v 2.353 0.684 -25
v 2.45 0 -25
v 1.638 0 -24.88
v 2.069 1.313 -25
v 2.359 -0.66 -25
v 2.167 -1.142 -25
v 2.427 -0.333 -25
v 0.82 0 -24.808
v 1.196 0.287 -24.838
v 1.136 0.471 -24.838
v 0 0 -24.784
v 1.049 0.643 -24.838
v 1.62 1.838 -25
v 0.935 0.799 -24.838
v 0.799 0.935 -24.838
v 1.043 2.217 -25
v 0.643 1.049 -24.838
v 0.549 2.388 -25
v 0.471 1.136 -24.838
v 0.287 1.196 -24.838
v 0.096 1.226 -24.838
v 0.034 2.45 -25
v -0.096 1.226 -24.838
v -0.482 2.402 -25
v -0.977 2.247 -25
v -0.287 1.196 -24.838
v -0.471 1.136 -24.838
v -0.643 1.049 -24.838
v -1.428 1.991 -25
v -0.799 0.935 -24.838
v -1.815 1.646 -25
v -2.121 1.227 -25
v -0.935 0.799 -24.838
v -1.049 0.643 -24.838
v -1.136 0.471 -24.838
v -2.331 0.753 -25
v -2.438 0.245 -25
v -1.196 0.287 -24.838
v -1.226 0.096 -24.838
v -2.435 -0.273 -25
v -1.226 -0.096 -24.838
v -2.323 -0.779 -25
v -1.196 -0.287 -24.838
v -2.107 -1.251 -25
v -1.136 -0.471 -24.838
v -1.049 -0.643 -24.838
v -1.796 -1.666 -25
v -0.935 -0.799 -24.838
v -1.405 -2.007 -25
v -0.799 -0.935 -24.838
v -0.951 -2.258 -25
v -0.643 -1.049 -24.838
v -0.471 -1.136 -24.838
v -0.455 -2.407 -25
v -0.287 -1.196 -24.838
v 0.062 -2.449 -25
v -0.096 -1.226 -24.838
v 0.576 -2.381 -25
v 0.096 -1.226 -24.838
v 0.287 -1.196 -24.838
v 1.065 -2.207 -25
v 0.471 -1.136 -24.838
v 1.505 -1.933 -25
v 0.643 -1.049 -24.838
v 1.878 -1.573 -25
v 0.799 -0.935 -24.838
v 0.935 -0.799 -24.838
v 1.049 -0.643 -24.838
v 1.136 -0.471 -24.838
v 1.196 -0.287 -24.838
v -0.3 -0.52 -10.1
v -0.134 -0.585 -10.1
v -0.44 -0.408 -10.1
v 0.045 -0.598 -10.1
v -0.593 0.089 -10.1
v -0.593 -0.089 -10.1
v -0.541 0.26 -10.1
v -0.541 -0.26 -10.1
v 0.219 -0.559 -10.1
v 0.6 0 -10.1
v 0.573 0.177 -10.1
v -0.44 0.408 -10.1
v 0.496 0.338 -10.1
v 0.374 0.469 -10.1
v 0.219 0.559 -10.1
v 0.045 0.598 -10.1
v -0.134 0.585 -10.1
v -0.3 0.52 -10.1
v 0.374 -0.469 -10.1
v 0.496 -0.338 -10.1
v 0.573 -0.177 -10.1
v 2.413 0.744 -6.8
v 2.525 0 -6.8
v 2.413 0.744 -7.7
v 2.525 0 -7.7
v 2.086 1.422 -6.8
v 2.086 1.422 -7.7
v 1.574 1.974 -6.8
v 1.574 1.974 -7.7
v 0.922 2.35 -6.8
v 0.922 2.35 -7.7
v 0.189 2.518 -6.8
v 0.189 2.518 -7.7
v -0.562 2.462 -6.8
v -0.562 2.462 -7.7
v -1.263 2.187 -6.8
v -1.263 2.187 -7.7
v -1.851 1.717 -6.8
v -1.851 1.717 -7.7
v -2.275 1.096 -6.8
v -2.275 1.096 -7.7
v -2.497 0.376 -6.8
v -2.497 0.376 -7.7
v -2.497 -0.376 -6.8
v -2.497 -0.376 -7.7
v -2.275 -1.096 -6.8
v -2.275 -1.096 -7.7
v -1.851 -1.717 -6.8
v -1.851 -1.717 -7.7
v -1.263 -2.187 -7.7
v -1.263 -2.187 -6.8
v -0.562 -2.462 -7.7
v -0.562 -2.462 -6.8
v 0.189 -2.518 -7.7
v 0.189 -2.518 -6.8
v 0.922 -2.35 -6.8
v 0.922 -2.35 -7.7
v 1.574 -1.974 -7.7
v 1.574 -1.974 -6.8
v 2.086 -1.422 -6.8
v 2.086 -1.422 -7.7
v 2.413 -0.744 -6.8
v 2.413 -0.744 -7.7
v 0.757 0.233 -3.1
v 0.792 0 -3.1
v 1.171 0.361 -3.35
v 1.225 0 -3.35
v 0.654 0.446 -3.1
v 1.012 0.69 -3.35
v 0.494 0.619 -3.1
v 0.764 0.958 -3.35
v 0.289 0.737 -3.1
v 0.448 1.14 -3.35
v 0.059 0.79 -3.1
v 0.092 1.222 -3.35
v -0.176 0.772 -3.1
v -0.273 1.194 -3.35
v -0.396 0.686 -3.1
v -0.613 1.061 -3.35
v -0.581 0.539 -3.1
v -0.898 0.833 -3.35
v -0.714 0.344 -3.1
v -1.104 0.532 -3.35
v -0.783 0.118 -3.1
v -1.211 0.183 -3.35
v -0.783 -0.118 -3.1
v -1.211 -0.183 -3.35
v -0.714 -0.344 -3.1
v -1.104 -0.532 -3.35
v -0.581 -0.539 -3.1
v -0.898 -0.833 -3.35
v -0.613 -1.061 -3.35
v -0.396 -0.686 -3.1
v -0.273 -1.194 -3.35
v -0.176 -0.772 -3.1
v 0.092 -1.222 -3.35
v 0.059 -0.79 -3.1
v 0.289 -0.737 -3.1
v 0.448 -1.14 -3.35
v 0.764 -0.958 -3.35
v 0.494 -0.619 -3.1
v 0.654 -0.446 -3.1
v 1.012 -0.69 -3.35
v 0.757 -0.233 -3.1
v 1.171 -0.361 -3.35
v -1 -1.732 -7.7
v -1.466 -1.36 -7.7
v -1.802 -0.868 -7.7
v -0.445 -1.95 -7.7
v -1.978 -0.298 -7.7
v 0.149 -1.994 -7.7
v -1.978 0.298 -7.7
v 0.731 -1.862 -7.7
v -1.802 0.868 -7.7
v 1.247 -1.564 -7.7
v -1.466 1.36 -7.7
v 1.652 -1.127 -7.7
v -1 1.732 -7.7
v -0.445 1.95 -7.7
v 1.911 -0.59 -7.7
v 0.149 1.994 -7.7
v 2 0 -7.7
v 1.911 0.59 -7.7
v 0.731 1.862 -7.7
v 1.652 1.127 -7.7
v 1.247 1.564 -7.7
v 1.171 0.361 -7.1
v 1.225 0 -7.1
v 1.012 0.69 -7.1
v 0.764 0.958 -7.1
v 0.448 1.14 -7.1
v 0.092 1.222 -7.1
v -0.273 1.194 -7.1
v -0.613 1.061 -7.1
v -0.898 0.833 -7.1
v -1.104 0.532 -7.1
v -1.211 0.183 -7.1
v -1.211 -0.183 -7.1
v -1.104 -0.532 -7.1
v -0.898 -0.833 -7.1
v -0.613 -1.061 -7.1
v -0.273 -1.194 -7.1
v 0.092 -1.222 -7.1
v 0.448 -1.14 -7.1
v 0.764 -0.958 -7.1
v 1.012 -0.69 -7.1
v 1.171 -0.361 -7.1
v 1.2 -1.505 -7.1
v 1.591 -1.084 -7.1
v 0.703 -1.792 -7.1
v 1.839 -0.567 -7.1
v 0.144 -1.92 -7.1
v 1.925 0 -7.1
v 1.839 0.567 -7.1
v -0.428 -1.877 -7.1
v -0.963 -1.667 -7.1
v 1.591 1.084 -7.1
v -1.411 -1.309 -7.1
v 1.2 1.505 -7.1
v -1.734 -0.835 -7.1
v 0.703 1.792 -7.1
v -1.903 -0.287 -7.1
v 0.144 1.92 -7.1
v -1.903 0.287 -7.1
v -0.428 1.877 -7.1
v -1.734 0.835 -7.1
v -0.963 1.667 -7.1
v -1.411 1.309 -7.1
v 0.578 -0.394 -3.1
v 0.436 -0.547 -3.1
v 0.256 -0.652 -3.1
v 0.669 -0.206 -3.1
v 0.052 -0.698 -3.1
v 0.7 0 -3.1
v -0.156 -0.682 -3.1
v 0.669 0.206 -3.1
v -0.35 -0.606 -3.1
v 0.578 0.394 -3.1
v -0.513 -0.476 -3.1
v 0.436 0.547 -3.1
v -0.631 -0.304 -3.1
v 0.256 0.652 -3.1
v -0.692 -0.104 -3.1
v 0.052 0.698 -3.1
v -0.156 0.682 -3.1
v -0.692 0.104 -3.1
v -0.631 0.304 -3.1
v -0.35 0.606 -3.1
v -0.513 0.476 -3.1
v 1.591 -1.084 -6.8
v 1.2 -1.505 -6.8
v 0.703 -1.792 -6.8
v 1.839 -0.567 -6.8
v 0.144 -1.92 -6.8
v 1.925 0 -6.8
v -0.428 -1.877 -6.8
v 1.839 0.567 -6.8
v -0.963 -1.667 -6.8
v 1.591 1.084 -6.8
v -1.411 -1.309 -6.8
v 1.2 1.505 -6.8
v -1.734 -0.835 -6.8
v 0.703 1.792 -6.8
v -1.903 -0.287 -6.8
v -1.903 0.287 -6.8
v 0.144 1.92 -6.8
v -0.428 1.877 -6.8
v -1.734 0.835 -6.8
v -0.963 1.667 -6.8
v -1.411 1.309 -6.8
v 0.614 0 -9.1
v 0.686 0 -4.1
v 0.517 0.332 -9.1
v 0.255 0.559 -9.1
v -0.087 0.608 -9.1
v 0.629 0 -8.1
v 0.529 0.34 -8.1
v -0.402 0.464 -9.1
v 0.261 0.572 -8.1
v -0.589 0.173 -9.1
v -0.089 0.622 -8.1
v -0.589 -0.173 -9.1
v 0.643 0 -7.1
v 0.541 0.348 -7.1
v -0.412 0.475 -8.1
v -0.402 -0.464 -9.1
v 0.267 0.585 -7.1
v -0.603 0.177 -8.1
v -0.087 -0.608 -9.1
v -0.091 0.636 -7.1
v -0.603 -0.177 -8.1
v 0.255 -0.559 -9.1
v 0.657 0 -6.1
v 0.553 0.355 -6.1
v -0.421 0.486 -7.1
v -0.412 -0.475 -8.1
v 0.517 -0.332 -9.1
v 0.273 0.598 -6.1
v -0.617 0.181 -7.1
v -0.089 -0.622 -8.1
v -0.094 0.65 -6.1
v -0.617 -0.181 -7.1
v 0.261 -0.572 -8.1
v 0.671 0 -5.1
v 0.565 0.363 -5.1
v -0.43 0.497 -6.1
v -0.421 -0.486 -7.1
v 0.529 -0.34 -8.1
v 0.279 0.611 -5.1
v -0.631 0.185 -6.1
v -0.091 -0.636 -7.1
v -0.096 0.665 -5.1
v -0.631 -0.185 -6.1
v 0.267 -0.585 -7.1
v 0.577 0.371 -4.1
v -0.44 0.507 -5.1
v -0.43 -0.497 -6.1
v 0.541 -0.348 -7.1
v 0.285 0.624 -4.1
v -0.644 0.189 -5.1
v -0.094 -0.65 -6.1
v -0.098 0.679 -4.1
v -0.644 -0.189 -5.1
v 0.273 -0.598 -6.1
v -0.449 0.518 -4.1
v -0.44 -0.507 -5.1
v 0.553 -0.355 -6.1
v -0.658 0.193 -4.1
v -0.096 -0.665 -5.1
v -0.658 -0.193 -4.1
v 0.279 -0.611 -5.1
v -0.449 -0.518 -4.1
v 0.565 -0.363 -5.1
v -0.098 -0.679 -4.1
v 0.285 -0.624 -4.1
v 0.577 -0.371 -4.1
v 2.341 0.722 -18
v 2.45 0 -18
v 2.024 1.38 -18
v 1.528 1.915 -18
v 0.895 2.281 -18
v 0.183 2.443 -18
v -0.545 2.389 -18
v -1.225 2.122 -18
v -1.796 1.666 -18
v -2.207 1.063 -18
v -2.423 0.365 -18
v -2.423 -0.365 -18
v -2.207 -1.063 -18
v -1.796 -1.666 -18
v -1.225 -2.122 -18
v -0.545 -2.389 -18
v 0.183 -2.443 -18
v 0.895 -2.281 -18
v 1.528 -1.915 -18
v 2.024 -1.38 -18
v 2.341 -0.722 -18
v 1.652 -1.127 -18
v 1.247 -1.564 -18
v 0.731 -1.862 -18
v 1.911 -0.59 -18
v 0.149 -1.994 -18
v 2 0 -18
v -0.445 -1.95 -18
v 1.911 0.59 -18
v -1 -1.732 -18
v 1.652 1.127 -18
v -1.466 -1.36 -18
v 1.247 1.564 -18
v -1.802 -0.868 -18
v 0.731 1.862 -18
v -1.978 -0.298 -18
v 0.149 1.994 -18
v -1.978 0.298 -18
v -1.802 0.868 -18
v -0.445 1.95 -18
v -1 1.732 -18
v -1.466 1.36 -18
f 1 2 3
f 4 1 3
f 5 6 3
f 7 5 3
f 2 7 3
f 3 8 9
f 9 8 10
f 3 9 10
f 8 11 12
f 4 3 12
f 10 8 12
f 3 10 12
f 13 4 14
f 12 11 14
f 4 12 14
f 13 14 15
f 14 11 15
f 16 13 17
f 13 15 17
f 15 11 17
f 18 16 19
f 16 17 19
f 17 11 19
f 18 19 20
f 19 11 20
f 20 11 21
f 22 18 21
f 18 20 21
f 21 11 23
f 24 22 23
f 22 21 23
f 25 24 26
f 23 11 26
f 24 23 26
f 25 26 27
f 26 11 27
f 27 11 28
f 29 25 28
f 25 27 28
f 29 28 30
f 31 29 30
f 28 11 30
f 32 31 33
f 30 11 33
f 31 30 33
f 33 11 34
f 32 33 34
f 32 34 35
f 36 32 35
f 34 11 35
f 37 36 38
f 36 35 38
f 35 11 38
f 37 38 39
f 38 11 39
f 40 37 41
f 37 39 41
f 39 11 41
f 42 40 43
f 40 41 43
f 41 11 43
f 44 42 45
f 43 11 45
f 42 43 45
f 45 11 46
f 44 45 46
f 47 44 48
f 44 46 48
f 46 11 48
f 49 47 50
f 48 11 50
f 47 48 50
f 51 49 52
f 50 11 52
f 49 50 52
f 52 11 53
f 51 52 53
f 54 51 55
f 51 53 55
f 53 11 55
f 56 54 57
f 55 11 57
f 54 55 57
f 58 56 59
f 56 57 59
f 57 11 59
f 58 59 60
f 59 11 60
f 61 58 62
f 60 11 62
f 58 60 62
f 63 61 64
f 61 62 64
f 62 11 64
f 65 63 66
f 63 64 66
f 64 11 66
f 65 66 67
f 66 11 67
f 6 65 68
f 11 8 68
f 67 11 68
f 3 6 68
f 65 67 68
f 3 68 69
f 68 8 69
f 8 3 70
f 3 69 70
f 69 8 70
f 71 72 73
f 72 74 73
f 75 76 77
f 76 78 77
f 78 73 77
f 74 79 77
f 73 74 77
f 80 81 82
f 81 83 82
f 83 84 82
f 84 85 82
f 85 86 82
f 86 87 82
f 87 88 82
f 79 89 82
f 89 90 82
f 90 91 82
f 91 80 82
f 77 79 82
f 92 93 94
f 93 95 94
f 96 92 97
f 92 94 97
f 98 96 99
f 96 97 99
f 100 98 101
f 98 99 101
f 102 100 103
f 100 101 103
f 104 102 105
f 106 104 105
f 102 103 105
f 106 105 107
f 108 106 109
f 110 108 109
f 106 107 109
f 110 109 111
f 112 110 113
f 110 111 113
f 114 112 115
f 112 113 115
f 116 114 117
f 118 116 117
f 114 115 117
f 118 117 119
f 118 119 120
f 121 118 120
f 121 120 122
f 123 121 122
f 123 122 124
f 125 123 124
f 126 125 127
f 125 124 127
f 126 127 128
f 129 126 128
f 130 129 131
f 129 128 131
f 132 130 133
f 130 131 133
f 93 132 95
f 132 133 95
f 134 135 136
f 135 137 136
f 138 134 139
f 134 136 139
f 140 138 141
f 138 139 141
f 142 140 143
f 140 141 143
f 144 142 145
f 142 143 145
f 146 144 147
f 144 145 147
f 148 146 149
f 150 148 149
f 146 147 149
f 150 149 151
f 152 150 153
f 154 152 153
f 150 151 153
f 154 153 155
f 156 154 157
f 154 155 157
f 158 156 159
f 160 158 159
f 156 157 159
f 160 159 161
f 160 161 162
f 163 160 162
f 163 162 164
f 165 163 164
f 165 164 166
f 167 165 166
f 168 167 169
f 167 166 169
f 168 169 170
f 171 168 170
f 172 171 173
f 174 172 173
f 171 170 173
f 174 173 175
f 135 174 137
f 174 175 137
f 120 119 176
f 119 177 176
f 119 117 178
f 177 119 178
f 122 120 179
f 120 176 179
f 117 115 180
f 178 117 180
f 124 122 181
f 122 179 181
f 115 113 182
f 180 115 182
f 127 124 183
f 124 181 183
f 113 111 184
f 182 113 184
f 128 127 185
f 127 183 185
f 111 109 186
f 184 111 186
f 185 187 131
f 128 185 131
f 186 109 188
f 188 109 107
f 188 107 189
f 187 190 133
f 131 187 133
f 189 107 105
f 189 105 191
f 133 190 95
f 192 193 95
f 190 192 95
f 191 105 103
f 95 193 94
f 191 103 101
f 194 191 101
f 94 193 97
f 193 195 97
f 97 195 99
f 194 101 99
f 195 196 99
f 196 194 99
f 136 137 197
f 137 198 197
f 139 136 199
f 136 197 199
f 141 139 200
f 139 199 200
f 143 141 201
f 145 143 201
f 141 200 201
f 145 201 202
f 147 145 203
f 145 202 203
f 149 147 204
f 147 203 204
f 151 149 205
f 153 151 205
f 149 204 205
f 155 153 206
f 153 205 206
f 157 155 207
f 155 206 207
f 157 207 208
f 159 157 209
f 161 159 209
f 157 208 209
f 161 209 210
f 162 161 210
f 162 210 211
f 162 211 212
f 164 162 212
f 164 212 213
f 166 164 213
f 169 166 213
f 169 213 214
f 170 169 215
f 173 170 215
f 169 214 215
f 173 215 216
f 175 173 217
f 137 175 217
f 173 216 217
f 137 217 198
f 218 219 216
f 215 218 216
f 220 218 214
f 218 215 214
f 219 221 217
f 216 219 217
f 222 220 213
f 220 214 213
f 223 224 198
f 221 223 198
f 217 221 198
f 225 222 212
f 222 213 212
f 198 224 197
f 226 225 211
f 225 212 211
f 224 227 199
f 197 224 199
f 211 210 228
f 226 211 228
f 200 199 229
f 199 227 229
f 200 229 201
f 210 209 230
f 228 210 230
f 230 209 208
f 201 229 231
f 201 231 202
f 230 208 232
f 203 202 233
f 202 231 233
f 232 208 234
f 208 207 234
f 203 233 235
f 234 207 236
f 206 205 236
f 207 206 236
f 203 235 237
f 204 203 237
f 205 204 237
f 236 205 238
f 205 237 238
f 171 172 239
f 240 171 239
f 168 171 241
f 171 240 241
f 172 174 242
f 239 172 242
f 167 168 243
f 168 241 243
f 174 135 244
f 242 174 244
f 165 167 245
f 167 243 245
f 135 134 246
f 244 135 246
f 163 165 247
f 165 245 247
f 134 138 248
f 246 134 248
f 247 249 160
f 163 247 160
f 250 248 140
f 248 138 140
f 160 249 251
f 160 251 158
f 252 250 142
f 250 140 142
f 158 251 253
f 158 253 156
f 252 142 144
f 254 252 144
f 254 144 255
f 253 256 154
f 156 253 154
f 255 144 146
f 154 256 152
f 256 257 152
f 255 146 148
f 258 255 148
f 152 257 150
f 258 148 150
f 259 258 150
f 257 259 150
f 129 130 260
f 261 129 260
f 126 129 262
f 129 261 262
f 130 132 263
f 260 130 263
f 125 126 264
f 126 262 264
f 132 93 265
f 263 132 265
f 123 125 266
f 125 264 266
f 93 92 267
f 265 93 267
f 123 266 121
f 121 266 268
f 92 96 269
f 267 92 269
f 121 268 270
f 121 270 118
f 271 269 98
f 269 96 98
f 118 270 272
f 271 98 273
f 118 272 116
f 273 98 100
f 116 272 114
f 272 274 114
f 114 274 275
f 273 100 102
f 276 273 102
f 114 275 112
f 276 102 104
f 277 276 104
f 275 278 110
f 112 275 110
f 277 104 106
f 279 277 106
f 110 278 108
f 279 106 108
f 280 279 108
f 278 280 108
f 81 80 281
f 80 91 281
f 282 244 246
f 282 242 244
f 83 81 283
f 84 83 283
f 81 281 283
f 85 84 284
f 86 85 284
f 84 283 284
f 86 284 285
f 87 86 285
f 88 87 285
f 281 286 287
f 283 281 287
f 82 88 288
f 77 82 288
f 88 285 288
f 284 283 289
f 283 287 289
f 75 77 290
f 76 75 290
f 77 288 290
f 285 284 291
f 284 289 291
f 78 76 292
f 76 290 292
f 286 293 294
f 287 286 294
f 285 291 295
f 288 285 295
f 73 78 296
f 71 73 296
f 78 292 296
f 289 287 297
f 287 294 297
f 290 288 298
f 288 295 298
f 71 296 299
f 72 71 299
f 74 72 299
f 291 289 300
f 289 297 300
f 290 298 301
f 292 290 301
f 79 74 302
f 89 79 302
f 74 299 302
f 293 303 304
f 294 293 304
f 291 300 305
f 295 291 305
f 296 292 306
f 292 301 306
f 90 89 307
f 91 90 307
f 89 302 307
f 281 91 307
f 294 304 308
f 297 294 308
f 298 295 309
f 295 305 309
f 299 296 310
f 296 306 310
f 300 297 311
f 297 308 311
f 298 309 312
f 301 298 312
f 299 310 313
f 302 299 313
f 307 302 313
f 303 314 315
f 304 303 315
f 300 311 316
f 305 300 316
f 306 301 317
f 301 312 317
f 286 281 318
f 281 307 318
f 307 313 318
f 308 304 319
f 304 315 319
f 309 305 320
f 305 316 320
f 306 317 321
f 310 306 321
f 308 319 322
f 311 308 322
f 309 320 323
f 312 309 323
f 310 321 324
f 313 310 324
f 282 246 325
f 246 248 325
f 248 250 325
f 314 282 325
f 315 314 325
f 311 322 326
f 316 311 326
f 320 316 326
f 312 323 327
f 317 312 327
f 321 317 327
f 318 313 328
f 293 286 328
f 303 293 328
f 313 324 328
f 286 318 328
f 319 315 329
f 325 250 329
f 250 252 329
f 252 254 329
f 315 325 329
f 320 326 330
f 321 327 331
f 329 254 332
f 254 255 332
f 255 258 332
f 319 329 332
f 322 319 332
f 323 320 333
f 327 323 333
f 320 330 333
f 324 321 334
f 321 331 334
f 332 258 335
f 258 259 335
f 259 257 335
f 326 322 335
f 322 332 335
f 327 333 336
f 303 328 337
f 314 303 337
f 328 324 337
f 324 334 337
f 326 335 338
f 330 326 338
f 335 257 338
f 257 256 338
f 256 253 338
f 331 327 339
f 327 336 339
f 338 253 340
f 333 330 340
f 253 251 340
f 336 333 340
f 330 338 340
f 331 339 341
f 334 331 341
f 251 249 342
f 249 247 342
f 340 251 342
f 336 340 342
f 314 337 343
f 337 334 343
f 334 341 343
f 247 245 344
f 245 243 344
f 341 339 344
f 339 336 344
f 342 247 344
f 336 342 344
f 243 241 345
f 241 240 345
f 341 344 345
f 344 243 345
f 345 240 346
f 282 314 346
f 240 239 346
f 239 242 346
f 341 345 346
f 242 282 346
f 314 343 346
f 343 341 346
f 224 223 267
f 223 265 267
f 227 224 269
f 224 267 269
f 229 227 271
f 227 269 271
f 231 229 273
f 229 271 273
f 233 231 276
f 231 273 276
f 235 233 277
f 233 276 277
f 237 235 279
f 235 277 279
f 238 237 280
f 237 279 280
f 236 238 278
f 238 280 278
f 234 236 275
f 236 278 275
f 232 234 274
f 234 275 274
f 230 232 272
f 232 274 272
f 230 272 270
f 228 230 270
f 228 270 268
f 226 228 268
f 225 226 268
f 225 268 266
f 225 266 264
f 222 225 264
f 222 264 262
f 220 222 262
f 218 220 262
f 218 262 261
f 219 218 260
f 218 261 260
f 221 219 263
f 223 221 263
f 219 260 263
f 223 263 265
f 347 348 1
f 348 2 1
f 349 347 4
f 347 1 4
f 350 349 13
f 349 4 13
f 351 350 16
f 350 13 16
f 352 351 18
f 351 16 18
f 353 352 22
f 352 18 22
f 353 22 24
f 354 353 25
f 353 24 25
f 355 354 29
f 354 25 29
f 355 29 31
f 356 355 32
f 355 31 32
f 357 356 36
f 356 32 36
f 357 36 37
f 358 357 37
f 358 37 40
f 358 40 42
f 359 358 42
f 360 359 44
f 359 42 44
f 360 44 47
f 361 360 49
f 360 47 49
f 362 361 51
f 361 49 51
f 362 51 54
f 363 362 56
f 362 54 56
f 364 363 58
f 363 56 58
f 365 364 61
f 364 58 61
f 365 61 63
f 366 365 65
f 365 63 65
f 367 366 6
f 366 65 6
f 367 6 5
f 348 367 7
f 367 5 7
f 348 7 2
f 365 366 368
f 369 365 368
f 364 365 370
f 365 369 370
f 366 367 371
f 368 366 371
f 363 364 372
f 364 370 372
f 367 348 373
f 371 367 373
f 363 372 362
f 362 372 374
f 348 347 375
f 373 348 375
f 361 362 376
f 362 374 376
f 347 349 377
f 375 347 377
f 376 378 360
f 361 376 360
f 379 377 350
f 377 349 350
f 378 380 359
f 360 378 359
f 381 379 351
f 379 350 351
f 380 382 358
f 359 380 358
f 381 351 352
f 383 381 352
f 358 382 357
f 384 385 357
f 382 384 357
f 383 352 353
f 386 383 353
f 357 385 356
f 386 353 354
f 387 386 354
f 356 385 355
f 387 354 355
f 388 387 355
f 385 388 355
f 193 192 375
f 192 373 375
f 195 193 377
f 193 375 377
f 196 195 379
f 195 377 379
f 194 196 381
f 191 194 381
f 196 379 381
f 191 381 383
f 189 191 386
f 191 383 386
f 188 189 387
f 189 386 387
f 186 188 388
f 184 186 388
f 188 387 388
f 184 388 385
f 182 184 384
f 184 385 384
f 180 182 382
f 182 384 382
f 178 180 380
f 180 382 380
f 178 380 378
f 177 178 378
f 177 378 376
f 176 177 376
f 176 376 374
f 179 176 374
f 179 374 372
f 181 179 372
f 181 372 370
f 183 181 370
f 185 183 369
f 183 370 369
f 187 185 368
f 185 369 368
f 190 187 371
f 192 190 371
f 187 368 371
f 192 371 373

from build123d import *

# Parameters (mm, degrees)
CUT_EXTRUDE1_START = -10
SKETCH2_R          = 5
SKETCH2_R_2        = 2.45
CUT_EXTRUDE1_DEPTH = 10


with BuildPart() as part:
    # Sketch1 → Revolve1 (revolve)
    with BuildSketch(Plane(origin=(0, 0, 0), x_dir=(1, 0, 0), z_dir=(0, 1, 0))):
        with BuildLine():
            Line((0, 24.784048752), (0, 10.1))
            Line((0, 10.1), (0.6, 10.1))
            Line((0.6, 10.1), (0.7, 3.1))
            Line((0.7, 3.1), (0.79197487, 3.1))
            Line((0.79197487, 3.1), (1.225, 3.350011099))
            Line((1.225, 3.350011099), (1.225, 7.1))
            Line((1.225, 7.1), (1.925, 7.1))
            Line((1.925, 7.1), (1.925, 6.8))
            Line((1.925, 6.8), (2.525, 6.8))
            Line((2.525, 6.8), (2.525, 7.7))
            Line((2.525, 7.7), (2, 7.7))
            Line((2, 7.7), (2, 18))
            Line((2, 18), (2.45, 18))
            Line((2.45, 18), (2.45, 24))
            Line((2.45, 24), (4.2, 24))
            Line((4.2, 24), (4.2, 18))
            Line((4.2, 18), (5, 18))
            Line((5, 18), (5, 25))
            ThreePointArc((5, 25), (4.79361011, 25.404713607), (4.344827586, 25.475312026))
            ThreePointArc((4.344827586, 25.475312026), (2.199737011, 24.957944562), (0, 24.784048752))
        make_face()
    revolve(axis=Axis((0, 0, -25.5), (0, 0, 1)))

    # Sketch2 → Cut-Extrude1 (cut)
    with BuildSketch(Plane.XY.offset(-18).offset(CUT_EXTRUDE1_START)):
        Circle(SKETCH2_R)
        Circle(SKETCH2_R_2, mode=Mode.SUBTRACT)
    extrude(amount=CUT_EXTRUDE1_DEPTH, mode=Mode.SUBTRACT)


solid = part.part
